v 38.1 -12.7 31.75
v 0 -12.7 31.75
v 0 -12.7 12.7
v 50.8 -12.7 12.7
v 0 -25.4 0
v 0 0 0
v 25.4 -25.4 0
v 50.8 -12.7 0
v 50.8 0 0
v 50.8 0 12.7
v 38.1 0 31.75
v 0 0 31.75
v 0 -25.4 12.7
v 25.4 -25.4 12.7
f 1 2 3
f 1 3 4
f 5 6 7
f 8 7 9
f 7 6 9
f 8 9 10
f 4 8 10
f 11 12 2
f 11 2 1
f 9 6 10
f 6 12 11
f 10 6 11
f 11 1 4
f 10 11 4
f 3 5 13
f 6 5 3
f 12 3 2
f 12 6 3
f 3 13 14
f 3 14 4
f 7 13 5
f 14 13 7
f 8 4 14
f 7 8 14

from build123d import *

# Parameters (mm, degrees)
F0_W     = 50.8
F0_H     = 31.75
F1_DEPTH = 25.4
F2_W     = 50.8
F2_H     = 19.05
F3_DEPTH = 12.7
F5_DEPTH = 25.4
F7_DEPTH = 25.4


with BuildPart() as f1:
    # F0 (on Front) → F1 (new body)
    with BuildSketch(Plane.XZ):
        with Locations((25.4, 15.875)):
            Rectangle(F0_W, F0_H)
    extrude(amount=F1_DEPTH)

    # F2 (on face) → F3 (cut)
    with BuildSketch(Plane.XZ.offset(25.4)):
        with Locations((25.4, 22.225)):
            Rectangle(F2_W, F2_H)
    extrude(amount=-F3_DEPTH, mode=Mode.SUBTRACT)

    # F4 (on face) → F5 (cut)
    with BuildSketch(Plane.XY.offset(12.7)):
        Polygon((50.8, -25.4), (50.8, -12.7), (25.4, -25.4), align=None)
    extrude(amount=-F5_DEPTH, mode=Mode.SUBTRACT)

    # F6 (on face) → F7 (cut)
    with BuildSketch(Plane.XZ.offset(12.7)):
        Polygon((38.1, 31.75), (50.8, 12.7), (50.8, 31.75), align=None)
    extrude(amount=-F7_DEPTH, mode=Mode.SUBTRACT)


solid = f1.part
